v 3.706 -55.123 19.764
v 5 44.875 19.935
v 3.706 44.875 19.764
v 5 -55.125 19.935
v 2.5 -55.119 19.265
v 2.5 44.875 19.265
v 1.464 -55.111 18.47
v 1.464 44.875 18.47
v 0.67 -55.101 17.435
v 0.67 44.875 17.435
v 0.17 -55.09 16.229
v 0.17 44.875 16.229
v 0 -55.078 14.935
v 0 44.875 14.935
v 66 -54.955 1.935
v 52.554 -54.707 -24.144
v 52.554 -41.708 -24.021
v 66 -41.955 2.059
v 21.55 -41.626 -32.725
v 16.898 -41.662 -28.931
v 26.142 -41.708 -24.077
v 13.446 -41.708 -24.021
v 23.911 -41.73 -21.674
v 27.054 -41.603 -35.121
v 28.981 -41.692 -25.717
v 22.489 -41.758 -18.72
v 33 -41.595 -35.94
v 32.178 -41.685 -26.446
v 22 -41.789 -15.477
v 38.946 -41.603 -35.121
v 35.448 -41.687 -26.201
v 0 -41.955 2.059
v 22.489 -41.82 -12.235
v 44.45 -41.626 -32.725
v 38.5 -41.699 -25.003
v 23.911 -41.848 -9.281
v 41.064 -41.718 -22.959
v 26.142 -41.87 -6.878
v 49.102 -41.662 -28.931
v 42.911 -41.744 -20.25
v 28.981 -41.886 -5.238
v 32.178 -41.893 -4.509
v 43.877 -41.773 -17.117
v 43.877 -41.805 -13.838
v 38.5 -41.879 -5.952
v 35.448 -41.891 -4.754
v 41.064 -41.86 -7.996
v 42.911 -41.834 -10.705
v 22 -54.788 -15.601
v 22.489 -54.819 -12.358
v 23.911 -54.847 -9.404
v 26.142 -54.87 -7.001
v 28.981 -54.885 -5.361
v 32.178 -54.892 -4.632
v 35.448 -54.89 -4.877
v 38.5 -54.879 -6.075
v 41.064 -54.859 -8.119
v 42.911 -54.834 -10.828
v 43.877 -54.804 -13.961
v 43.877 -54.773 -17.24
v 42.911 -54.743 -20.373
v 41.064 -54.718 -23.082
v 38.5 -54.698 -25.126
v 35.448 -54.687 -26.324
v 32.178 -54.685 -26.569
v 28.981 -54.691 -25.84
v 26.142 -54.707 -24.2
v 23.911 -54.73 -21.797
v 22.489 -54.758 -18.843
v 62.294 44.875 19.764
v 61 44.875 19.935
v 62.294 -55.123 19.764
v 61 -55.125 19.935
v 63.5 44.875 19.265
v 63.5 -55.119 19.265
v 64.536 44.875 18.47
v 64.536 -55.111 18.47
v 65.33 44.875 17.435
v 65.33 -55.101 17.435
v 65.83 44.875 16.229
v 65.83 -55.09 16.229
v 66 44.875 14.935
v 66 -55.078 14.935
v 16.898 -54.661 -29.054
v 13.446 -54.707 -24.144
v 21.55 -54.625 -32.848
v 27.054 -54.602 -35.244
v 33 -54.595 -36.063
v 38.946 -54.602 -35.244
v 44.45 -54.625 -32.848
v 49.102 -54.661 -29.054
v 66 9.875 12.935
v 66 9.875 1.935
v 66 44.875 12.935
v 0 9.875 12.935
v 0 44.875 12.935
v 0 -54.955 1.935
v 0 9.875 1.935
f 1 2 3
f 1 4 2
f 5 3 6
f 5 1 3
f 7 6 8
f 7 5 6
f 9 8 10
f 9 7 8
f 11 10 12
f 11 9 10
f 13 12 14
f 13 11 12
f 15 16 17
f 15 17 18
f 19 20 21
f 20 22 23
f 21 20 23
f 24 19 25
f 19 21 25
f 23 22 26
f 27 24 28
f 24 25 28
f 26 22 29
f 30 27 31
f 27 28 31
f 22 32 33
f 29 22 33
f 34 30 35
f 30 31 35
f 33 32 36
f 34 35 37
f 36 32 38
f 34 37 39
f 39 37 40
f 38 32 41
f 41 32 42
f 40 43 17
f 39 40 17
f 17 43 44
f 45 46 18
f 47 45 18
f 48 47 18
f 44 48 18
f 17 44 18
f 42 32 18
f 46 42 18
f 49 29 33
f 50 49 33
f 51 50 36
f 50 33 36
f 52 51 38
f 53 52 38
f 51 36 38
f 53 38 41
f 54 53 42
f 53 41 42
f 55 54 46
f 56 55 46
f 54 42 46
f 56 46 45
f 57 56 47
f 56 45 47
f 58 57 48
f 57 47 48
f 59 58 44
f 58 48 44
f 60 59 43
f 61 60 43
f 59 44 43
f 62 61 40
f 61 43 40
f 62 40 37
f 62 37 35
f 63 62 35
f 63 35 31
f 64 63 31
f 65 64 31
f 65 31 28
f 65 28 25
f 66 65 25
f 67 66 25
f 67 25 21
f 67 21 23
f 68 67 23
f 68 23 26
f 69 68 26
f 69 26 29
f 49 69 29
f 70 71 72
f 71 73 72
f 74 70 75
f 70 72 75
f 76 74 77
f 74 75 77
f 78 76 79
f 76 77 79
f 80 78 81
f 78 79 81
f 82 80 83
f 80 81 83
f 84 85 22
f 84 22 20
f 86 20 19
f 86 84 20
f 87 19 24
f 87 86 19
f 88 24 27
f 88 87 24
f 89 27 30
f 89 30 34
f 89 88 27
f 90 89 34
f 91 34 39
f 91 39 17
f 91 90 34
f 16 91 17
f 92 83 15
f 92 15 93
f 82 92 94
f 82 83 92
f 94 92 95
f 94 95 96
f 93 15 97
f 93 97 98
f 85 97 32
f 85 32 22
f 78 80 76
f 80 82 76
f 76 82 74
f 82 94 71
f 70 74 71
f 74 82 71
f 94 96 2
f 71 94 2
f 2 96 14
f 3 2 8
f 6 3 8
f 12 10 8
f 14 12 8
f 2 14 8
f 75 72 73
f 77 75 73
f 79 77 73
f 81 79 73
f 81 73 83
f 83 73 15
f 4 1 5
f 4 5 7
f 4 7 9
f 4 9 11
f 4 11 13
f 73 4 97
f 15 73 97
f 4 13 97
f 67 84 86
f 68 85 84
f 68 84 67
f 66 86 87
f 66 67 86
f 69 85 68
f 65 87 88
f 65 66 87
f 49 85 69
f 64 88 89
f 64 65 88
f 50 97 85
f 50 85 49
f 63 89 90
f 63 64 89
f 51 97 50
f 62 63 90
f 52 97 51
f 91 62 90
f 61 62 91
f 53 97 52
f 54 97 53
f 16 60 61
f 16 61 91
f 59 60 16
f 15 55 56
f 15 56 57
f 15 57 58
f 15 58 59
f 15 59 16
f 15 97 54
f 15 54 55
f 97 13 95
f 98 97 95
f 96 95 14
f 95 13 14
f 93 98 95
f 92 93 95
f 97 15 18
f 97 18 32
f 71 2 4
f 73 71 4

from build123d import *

# Parameters (mm, degrees)
F1_DEPTH = 66
F3_DEPTH = 13
F5_D     = 22
F6_R     = 5


with BuildPart() as f1:
    # F0 (on Right) → F1 (new body)
    with BuildSketch(Plane.YZ):
        Polygon((-54.954562, 1.935452), (9.874931, 1.935452), (9.874931, 12.934644), (44.874931, 12.934644), (44.874931, 19.934644), (-55.125069, 19.934644), align=None)
    extrude(amount=F1_DEPTH)

    # F6
    f6_edges = [f1.edges().sort_by_distance(p)[0] for p in [
        (0, -5.125069, 19.934644),
        (66, -5.125069, 19.934644),
    ]]
    fillet(f6_edges, radius=F6_R)


with BuildPart() as f3:
    # F2 (on face) → F3 (new body)
    with BuildSketch(Plane(origin=(0, -54.931298, -0.520364), x_dir=(1, 0, 0), z_dir=(0, -0.999955, -0.009473))):
        with BuildLine():
            Line((0, 2.455926), (13.445601, -23.625021))
            ThreePointArc((13.445601, -23.625021), (33, -35.544074), (52.554399, -23.625021))
            Line((52.554399, -23.625021), (66, 2.455926))
            Line((66, 2.455926), (0, 2.455926))
        make_face()
    extrude(amount=-F3_DEPTH)

    # F5 (through all)
    with Locations(Plane(origin=(0, -54.931298, -0.520364), x_dir=(1, 0, 0), z_dir=(0, -0.999955, -0.009473))):
        with Locations((33, -15.080847)):
            Hole(F5_D / 2)


solid = Compound([f1.part, f3.part])
